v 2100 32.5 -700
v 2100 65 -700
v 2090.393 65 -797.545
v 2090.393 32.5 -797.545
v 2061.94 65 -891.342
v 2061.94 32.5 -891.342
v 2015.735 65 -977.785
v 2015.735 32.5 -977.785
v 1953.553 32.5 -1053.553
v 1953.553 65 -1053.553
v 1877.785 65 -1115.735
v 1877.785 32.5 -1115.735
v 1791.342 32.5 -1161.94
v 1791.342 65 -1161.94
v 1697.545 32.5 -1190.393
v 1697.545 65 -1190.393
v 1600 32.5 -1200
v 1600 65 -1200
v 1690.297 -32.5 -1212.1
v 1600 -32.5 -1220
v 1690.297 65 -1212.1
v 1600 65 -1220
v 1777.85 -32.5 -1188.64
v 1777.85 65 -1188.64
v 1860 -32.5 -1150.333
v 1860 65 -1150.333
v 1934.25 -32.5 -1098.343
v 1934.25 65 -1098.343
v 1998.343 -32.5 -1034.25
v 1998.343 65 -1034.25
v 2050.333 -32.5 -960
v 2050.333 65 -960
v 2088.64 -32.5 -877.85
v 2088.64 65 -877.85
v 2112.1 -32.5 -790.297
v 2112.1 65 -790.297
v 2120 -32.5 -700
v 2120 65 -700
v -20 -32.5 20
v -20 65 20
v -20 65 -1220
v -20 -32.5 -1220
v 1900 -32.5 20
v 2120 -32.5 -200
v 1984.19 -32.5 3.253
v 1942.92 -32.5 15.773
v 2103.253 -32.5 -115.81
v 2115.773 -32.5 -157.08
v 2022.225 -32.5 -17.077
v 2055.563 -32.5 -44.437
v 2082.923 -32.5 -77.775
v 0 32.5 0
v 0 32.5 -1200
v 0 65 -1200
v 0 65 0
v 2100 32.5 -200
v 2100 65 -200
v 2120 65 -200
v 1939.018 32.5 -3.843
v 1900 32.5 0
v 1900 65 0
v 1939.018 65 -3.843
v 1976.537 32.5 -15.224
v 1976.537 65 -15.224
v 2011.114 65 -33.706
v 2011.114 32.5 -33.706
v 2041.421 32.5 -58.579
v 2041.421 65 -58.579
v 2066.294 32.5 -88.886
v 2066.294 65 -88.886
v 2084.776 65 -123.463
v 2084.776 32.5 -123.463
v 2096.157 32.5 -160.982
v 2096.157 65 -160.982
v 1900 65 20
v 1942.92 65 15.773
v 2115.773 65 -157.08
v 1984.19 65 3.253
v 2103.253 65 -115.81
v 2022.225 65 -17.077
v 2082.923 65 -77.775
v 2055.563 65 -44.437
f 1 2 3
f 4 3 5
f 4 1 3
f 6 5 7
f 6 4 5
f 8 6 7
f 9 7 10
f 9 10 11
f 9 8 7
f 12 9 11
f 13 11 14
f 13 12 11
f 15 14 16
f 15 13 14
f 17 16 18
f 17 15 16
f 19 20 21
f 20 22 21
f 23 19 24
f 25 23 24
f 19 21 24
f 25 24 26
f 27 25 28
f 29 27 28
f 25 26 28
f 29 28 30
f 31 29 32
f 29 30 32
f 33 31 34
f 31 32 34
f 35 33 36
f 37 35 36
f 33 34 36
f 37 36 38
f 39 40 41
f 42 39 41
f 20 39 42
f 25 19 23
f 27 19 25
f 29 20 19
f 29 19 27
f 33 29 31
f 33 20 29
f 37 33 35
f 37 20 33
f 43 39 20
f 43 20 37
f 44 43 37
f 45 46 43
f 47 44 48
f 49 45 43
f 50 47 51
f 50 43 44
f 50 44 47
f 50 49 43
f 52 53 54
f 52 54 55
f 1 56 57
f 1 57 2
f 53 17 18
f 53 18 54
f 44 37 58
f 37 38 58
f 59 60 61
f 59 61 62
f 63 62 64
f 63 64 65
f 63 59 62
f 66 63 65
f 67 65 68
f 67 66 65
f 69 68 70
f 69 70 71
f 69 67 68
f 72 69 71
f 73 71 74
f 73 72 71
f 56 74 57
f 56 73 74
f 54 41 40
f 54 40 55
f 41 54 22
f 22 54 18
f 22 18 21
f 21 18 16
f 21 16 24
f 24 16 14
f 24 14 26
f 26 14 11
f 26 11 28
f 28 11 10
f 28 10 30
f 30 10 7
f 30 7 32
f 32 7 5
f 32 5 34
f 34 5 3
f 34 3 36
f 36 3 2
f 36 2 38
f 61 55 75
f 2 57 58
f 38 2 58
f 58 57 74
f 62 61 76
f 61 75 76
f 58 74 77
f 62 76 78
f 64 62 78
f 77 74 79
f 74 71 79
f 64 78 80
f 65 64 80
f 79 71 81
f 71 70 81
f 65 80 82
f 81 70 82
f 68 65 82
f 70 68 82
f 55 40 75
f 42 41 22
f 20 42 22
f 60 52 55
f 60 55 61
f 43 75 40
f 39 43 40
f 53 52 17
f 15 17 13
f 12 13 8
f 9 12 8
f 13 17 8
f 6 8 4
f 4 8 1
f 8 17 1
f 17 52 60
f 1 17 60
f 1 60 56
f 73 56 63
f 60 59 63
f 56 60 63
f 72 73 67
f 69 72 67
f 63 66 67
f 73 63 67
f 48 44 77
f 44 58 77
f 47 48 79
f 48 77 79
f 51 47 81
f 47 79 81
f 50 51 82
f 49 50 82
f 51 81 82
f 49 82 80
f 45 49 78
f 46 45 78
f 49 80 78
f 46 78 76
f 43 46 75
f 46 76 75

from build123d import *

# Parameters (mm, degrees)
F1_DEPTH = 32.5
F2_DEPTH = 65
F3_DEPTH = 32.5


# Not quite as in the source:
# - a feature names something its author has since deleted; it is built from what else it names


with BuildPart() as f1:
    # F0 (on Front) → F1 (new body, symmetric)
    with BuildSketch(Plane.XZ):
        with BuildLine():
            Line((1900, 0), (0, 0))
            Line((0, 0), (0, -1200))
            Line((0, -1200), (1600, -1200))
            ThreePointArc((1600, -1200), (1953.5533905933, -1053.5533905933), (2100, -700))
            Line((2100, -700), (2100, -200))
            ThreePointArc((2100, -200), (2041.4213562373, -58.5786437627), (1900, 0))
        make_face()
    extrude(amount=F1_DEPTH, both=True)

    # F0 (on Front) → F2 (join)
    with BuildSketch(Plane.XZ):
        with BuildLine():
            Line((-20, -1220), (1600, -1220))
            ThreePointArc((1600, -1220), (1967.695526217, -1067.695526217), (2120, -700))
            Line((2120, -700), (2120, -200))
            ThreePointArc((2120, -200), (2055.563491861, -44.436508139), (1900, 20))
            Line((1900, 20), (-20, 20))
            Line((-20, 20), (-20, -1220))
        make_face()
        with BuildLine():
            Line((0, -1200), (0, 0))
            Line((0, 0), (1900, 0))
            ThreePointArc((1900, 0), (2041.4213562373, -58.5786437627), (2100, -200))
            Line((2100, -200), (2100, -700))
            ThreePointArc((2100, -700), (1953.5533905933, -1053.5533905933), (1600, -1200))
            Line((1600, -1200), (0, -1200))
        make_face(mode=Mode.SUBTRACT)
    extrude(amount=-F2_DEPTH)

    # F0 (on Front) → F3 (join)
    with BuildSketch(Plane.XZ):
        with BuildLine():
            Line((-20, -1220), (1600, -1220))
            ThreePointArc((1600, -1220), (1967.695526217, -1067.695526217), (2120, -700))
            Line((2120, -700), (2120, -200))
            ThreePointArc((2120, -200), (2055.563491861, -44.436508139), (1900, 20))
            Line((1900, 20), (-20, 20))
            Line((-20, 20), (-20, -1220))
        make_face()
        with BuildLine():
            Line((0, -1200), (0, 0))
            Line((0, 0), (1900, 0))
            ThreePointArc((1900, 0), (2041.4213562373, -58.5786437627), (2100, -200))
            Line((2100, -200), (2100, -700))
            ThreePointArc((2100, -700), (1953.5533905933, -1053.5533905933), (1600, -1200))
            Line((1600, -1200), (0, -1200))
        make_face(mode=Mode.SUBTRACT)
    extrude(amount=F3_DEPTH)


solid = f1.part
